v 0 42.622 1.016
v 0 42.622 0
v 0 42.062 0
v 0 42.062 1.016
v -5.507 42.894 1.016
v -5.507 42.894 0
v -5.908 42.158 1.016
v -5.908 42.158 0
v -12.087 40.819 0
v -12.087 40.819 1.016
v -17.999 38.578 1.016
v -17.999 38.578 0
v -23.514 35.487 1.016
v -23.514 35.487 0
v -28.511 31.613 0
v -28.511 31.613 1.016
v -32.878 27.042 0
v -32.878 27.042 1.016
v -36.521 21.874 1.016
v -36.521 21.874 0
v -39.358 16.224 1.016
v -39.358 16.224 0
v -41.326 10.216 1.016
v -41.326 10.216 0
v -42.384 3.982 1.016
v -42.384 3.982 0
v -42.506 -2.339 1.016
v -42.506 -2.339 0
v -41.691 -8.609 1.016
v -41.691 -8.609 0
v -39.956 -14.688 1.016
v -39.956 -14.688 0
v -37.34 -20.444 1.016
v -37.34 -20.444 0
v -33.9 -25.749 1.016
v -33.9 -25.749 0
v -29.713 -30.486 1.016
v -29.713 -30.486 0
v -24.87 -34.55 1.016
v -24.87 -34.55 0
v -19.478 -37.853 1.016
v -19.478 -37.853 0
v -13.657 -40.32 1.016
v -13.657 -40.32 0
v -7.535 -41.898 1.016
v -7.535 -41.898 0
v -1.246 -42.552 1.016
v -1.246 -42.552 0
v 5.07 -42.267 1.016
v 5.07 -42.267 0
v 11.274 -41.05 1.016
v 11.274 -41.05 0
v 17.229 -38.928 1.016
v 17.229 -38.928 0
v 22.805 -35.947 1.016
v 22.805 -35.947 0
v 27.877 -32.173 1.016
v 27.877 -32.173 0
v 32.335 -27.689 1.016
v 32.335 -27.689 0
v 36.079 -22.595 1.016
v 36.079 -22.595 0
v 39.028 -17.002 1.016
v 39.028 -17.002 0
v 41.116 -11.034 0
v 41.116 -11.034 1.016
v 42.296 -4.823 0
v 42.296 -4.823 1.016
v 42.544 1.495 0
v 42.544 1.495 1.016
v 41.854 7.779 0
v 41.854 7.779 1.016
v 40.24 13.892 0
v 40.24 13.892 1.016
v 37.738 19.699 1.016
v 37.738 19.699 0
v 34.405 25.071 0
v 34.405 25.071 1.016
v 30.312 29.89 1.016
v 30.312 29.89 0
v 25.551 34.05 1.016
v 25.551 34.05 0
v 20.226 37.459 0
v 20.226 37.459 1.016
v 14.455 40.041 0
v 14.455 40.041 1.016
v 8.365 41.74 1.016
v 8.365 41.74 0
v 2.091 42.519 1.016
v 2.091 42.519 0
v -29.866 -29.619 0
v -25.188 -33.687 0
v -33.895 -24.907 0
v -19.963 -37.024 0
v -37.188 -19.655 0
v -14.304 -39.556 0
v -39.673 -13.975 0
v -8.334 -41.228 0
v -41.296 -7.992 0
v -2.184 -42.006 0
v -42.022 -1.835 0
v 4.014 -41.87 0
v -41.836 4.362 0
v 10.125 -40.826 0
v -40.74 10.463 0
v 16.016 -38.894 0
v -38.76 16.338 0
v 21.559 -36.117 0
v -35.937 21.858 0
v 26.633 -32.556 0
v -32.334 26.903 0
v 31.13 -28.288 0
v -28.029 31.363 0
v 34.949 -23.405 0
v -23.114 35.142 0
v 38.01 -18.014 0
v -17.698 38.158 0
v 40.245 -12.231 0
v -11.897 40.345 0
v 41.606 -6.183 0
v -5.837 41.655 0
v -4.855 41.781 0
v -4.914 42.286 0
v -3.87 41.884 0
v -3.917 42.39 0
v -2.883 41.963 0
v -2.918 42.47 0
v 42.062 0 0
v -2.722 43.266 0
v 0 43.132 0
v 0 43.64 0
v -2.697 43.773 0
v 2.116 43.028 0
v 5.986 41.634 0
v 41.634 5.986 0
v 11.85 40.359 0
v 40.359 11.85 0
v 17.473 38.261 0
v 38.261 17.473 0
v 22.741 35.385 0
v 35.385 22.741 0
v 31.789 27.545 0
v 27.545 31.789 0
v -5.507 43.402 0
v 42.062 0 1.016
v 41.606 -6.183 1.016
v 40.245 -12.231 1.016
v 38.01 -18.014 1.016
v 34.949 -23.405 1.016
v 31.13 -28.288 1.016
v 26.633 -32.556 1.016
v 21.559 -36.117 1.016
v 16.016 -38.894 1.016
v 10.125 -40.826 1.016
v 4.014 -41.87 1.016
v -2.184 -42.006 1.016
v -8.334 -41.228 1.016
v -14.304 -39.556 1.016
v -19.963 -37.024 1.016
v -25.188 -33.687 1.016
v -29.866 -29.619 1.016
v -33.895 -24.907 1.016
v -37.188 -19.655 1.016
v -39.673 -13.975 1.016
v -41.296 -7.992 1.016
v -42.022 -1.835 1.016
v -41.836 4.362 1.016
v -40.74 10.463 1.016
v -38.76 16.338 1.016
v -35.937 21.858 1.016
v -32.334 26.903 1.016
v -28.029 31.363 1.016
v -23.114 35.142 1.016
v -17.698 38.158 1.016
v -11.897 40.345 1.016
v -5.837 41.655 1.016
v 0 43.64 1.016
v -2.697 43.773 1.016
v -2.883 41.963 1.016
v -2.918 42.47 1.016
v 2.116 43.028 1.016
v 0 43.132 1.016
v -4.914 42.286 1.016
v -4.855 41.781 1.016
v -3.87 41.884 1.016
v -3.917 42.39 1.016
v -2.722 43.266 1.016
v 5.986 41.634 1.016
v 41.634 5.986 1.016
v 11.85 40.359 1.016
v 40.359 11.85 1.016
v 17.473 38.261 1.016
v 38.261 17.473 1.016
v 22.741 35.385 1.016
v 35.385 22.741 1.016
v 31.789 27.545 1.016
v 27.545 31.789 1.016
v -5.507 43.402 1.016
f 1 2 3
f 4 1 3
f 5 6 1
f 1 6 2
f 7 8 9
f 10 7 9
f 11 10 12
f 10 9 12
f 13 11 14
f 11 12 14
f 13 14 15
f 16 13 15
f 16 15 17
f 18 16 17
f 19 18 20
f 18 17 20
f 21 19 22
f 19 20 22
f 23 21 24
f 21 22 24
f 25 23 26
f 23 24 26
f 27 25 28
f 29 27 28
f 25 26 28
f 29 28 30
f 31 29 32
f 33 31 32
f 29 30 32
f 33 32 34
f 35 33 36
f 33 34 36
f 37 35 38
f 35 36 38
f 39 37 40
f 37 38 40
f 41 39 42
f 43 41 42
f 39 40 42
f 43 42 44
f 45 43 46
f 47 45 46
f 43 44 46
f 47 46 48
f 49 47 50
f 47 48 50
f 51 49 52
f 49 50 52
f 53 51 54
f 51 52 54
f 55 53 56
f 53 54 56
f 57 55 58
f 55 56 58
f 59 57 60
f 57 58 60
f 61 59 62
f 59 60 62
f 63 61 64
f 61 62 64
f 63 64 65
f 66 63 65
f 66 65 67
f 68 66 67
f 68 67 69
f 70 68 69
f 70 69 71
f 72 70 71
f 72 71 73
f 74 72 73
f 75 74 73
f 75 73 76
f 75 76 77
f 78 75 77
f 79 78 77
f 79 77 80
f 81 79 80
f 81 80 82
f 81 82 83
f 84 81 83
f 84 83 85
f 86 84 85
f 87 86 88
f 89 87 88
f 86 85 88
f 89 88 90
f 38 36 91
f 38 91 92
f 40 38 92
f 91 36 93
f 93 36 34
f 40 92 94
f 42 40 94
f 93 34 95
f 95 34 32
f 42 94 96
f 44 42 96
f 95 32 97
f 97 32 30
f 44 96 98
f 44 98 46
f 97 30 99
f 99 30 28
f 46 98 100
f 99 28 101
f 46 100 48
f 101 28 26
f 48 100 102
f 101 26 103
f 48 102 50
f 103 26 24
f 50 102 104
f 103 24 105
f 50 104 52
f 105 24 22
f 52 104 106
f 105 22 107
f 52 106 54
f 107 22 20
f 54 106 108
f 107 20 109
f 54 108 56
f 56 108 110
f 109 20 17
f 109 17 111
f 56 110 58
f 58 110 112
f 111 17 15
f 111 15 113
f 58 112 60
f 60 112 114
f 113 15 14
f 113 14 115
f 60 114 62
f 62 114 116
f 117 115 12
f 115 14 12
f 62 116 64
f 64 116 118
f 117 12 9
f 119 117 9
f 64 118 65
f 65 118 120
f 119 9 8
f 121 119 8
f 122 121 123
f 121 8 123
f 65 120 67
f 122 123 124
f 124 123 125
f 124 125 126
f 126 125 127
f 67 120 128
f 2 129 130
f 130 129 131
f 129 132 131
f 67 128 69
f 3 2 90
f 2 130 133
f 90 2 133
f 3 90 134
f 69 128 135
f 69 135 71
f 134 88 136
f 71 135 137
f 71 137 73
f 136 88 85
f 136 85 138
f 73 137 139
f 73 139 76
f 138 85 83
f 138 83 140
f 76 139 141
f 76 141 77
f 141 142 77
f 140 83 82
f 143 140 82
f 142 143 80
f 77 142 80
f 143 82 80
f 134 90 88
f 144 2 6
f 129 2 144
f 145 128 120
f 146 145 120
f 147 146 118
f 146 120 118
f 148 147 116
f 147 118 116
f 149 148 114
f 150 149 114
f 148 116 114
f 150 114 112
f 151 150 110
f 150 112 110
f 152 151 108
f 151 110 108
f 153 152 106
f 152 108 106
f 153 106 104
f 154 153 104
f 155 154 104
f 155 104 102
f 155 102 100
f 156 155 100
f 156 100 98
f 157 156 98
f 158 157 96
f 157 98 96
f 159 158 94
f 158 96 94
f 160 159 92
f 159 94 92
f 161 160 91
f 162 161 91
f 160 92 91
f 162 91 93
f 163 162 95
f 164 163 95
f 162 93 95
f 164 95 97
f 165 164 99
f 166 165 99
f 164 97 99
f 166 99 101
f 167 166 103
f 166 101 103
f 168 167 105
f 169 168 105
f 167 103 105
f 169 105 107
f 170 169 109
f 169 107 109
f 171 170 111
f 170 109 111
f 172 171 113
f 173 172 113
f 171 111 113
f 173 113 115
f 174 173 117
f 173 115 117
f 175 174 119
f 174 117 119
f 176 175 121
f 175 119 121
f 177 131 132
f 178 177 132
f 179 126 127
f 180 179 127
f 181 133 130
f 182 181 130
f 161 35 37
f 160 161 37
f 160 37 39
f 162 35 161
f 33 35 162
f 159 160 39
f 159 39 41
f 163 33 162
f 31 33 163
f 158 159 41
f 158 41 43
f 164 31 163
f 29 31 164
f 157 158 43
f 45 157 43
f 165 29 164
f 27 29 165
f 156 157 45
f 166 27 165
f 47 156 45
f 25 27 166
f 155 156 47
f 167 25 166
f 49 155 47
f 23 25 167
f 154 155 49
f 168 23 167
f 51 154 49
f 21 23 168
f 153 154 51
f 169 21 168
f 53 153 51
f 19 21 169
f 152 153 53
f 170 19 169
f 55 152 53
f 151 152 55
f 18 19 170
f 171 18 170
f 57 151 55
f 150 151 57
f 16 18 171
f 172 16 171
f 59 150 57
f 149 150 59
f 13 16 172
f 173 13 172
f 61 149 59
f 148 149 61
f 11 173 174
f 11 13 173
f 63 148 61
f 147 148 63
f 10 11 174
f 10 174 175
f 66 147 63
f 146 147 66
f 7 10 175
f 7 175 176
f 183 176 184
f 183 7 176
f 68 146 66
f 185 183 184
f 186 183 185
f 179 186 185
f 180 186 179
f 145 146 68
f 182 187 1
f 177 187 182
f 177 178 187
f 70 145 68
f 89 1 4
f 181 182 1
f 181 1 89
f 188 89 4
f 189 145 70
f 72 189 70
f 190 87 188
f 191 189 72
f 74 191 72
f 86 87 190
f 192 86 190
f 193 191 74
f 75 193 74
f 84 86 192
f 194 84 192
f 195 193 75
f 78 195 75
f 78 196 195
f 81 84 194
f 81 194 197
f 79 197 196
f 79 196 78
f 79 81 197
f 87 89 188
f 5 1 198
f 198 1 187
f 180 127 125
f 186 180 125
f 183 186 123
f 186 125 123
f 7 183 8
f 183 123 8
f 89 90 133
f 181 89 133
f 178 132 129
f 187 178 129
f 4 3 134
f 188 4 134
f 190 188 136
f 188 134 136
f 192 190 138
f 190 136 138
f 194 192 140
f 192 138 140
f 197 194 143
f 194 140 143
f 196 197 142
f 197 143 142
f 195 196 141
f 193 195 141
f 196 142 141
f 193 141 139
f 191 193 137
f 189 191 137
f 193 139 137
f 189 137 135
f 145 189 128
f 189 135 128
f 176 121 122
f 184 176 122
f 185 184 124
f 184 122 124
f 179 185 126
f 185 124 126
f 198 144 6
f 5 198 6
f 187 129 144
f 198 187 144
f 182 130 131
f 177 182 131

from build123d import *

# Parameters (mm, degrees)
F1_DEPTH = 1.016


with BuildPart() as f1:
    # F0 (on Top) → F1 (new body)
    with BuildSketch(Plane.XY):
        with BuildLine():
            ThreePointArc((42.0624, 0), (-27.601786, -31.739359), (-5.83724, 41.655397))
            ThreePointArc((-5.83724, 41.655397), (-4.362841, 41.835524), (-2.883003, 41.963482))
            Line((-2.883003, 41.963482), (-2.917822, 42.470287))
            ThreePointArc((-2.917822, 42.470287), (-4.415533, 42.340784), (-5.907738, 42.158482))
            ThreePointArc((-5.907738, 42.158482), (1.91701, -42.527215), (2.090709, 42.51903))
            Line((2.090709, 42.51903), (2.115717, 43.027622))
            Line((2.115717, 43.027622), (0, 43.131654))
            Line((0, 43.131654), (0, 43.640268))
            Line((0, 43.640268), (-2.697201, 43.772892))
            Line((-2.697201, 43.772892), (-2.72215, 43.265505))
            Line((-2.72215, 43.265505), (-5.507269, 43.402453))
            Line((-5.507269, 43.402453), (-5.507269, 42.894453))
            Line((-5.507269, 42.894453), (0, 42.622334))
            Line((0, 42.622334), (0, 42.0624))
            ThreePointArc((0, 42.0624), (29.742608, 29.742608), (42.0624, 0))
        make_face()
    extrude(amount=F1_DEPTH)


solid = f1.part
